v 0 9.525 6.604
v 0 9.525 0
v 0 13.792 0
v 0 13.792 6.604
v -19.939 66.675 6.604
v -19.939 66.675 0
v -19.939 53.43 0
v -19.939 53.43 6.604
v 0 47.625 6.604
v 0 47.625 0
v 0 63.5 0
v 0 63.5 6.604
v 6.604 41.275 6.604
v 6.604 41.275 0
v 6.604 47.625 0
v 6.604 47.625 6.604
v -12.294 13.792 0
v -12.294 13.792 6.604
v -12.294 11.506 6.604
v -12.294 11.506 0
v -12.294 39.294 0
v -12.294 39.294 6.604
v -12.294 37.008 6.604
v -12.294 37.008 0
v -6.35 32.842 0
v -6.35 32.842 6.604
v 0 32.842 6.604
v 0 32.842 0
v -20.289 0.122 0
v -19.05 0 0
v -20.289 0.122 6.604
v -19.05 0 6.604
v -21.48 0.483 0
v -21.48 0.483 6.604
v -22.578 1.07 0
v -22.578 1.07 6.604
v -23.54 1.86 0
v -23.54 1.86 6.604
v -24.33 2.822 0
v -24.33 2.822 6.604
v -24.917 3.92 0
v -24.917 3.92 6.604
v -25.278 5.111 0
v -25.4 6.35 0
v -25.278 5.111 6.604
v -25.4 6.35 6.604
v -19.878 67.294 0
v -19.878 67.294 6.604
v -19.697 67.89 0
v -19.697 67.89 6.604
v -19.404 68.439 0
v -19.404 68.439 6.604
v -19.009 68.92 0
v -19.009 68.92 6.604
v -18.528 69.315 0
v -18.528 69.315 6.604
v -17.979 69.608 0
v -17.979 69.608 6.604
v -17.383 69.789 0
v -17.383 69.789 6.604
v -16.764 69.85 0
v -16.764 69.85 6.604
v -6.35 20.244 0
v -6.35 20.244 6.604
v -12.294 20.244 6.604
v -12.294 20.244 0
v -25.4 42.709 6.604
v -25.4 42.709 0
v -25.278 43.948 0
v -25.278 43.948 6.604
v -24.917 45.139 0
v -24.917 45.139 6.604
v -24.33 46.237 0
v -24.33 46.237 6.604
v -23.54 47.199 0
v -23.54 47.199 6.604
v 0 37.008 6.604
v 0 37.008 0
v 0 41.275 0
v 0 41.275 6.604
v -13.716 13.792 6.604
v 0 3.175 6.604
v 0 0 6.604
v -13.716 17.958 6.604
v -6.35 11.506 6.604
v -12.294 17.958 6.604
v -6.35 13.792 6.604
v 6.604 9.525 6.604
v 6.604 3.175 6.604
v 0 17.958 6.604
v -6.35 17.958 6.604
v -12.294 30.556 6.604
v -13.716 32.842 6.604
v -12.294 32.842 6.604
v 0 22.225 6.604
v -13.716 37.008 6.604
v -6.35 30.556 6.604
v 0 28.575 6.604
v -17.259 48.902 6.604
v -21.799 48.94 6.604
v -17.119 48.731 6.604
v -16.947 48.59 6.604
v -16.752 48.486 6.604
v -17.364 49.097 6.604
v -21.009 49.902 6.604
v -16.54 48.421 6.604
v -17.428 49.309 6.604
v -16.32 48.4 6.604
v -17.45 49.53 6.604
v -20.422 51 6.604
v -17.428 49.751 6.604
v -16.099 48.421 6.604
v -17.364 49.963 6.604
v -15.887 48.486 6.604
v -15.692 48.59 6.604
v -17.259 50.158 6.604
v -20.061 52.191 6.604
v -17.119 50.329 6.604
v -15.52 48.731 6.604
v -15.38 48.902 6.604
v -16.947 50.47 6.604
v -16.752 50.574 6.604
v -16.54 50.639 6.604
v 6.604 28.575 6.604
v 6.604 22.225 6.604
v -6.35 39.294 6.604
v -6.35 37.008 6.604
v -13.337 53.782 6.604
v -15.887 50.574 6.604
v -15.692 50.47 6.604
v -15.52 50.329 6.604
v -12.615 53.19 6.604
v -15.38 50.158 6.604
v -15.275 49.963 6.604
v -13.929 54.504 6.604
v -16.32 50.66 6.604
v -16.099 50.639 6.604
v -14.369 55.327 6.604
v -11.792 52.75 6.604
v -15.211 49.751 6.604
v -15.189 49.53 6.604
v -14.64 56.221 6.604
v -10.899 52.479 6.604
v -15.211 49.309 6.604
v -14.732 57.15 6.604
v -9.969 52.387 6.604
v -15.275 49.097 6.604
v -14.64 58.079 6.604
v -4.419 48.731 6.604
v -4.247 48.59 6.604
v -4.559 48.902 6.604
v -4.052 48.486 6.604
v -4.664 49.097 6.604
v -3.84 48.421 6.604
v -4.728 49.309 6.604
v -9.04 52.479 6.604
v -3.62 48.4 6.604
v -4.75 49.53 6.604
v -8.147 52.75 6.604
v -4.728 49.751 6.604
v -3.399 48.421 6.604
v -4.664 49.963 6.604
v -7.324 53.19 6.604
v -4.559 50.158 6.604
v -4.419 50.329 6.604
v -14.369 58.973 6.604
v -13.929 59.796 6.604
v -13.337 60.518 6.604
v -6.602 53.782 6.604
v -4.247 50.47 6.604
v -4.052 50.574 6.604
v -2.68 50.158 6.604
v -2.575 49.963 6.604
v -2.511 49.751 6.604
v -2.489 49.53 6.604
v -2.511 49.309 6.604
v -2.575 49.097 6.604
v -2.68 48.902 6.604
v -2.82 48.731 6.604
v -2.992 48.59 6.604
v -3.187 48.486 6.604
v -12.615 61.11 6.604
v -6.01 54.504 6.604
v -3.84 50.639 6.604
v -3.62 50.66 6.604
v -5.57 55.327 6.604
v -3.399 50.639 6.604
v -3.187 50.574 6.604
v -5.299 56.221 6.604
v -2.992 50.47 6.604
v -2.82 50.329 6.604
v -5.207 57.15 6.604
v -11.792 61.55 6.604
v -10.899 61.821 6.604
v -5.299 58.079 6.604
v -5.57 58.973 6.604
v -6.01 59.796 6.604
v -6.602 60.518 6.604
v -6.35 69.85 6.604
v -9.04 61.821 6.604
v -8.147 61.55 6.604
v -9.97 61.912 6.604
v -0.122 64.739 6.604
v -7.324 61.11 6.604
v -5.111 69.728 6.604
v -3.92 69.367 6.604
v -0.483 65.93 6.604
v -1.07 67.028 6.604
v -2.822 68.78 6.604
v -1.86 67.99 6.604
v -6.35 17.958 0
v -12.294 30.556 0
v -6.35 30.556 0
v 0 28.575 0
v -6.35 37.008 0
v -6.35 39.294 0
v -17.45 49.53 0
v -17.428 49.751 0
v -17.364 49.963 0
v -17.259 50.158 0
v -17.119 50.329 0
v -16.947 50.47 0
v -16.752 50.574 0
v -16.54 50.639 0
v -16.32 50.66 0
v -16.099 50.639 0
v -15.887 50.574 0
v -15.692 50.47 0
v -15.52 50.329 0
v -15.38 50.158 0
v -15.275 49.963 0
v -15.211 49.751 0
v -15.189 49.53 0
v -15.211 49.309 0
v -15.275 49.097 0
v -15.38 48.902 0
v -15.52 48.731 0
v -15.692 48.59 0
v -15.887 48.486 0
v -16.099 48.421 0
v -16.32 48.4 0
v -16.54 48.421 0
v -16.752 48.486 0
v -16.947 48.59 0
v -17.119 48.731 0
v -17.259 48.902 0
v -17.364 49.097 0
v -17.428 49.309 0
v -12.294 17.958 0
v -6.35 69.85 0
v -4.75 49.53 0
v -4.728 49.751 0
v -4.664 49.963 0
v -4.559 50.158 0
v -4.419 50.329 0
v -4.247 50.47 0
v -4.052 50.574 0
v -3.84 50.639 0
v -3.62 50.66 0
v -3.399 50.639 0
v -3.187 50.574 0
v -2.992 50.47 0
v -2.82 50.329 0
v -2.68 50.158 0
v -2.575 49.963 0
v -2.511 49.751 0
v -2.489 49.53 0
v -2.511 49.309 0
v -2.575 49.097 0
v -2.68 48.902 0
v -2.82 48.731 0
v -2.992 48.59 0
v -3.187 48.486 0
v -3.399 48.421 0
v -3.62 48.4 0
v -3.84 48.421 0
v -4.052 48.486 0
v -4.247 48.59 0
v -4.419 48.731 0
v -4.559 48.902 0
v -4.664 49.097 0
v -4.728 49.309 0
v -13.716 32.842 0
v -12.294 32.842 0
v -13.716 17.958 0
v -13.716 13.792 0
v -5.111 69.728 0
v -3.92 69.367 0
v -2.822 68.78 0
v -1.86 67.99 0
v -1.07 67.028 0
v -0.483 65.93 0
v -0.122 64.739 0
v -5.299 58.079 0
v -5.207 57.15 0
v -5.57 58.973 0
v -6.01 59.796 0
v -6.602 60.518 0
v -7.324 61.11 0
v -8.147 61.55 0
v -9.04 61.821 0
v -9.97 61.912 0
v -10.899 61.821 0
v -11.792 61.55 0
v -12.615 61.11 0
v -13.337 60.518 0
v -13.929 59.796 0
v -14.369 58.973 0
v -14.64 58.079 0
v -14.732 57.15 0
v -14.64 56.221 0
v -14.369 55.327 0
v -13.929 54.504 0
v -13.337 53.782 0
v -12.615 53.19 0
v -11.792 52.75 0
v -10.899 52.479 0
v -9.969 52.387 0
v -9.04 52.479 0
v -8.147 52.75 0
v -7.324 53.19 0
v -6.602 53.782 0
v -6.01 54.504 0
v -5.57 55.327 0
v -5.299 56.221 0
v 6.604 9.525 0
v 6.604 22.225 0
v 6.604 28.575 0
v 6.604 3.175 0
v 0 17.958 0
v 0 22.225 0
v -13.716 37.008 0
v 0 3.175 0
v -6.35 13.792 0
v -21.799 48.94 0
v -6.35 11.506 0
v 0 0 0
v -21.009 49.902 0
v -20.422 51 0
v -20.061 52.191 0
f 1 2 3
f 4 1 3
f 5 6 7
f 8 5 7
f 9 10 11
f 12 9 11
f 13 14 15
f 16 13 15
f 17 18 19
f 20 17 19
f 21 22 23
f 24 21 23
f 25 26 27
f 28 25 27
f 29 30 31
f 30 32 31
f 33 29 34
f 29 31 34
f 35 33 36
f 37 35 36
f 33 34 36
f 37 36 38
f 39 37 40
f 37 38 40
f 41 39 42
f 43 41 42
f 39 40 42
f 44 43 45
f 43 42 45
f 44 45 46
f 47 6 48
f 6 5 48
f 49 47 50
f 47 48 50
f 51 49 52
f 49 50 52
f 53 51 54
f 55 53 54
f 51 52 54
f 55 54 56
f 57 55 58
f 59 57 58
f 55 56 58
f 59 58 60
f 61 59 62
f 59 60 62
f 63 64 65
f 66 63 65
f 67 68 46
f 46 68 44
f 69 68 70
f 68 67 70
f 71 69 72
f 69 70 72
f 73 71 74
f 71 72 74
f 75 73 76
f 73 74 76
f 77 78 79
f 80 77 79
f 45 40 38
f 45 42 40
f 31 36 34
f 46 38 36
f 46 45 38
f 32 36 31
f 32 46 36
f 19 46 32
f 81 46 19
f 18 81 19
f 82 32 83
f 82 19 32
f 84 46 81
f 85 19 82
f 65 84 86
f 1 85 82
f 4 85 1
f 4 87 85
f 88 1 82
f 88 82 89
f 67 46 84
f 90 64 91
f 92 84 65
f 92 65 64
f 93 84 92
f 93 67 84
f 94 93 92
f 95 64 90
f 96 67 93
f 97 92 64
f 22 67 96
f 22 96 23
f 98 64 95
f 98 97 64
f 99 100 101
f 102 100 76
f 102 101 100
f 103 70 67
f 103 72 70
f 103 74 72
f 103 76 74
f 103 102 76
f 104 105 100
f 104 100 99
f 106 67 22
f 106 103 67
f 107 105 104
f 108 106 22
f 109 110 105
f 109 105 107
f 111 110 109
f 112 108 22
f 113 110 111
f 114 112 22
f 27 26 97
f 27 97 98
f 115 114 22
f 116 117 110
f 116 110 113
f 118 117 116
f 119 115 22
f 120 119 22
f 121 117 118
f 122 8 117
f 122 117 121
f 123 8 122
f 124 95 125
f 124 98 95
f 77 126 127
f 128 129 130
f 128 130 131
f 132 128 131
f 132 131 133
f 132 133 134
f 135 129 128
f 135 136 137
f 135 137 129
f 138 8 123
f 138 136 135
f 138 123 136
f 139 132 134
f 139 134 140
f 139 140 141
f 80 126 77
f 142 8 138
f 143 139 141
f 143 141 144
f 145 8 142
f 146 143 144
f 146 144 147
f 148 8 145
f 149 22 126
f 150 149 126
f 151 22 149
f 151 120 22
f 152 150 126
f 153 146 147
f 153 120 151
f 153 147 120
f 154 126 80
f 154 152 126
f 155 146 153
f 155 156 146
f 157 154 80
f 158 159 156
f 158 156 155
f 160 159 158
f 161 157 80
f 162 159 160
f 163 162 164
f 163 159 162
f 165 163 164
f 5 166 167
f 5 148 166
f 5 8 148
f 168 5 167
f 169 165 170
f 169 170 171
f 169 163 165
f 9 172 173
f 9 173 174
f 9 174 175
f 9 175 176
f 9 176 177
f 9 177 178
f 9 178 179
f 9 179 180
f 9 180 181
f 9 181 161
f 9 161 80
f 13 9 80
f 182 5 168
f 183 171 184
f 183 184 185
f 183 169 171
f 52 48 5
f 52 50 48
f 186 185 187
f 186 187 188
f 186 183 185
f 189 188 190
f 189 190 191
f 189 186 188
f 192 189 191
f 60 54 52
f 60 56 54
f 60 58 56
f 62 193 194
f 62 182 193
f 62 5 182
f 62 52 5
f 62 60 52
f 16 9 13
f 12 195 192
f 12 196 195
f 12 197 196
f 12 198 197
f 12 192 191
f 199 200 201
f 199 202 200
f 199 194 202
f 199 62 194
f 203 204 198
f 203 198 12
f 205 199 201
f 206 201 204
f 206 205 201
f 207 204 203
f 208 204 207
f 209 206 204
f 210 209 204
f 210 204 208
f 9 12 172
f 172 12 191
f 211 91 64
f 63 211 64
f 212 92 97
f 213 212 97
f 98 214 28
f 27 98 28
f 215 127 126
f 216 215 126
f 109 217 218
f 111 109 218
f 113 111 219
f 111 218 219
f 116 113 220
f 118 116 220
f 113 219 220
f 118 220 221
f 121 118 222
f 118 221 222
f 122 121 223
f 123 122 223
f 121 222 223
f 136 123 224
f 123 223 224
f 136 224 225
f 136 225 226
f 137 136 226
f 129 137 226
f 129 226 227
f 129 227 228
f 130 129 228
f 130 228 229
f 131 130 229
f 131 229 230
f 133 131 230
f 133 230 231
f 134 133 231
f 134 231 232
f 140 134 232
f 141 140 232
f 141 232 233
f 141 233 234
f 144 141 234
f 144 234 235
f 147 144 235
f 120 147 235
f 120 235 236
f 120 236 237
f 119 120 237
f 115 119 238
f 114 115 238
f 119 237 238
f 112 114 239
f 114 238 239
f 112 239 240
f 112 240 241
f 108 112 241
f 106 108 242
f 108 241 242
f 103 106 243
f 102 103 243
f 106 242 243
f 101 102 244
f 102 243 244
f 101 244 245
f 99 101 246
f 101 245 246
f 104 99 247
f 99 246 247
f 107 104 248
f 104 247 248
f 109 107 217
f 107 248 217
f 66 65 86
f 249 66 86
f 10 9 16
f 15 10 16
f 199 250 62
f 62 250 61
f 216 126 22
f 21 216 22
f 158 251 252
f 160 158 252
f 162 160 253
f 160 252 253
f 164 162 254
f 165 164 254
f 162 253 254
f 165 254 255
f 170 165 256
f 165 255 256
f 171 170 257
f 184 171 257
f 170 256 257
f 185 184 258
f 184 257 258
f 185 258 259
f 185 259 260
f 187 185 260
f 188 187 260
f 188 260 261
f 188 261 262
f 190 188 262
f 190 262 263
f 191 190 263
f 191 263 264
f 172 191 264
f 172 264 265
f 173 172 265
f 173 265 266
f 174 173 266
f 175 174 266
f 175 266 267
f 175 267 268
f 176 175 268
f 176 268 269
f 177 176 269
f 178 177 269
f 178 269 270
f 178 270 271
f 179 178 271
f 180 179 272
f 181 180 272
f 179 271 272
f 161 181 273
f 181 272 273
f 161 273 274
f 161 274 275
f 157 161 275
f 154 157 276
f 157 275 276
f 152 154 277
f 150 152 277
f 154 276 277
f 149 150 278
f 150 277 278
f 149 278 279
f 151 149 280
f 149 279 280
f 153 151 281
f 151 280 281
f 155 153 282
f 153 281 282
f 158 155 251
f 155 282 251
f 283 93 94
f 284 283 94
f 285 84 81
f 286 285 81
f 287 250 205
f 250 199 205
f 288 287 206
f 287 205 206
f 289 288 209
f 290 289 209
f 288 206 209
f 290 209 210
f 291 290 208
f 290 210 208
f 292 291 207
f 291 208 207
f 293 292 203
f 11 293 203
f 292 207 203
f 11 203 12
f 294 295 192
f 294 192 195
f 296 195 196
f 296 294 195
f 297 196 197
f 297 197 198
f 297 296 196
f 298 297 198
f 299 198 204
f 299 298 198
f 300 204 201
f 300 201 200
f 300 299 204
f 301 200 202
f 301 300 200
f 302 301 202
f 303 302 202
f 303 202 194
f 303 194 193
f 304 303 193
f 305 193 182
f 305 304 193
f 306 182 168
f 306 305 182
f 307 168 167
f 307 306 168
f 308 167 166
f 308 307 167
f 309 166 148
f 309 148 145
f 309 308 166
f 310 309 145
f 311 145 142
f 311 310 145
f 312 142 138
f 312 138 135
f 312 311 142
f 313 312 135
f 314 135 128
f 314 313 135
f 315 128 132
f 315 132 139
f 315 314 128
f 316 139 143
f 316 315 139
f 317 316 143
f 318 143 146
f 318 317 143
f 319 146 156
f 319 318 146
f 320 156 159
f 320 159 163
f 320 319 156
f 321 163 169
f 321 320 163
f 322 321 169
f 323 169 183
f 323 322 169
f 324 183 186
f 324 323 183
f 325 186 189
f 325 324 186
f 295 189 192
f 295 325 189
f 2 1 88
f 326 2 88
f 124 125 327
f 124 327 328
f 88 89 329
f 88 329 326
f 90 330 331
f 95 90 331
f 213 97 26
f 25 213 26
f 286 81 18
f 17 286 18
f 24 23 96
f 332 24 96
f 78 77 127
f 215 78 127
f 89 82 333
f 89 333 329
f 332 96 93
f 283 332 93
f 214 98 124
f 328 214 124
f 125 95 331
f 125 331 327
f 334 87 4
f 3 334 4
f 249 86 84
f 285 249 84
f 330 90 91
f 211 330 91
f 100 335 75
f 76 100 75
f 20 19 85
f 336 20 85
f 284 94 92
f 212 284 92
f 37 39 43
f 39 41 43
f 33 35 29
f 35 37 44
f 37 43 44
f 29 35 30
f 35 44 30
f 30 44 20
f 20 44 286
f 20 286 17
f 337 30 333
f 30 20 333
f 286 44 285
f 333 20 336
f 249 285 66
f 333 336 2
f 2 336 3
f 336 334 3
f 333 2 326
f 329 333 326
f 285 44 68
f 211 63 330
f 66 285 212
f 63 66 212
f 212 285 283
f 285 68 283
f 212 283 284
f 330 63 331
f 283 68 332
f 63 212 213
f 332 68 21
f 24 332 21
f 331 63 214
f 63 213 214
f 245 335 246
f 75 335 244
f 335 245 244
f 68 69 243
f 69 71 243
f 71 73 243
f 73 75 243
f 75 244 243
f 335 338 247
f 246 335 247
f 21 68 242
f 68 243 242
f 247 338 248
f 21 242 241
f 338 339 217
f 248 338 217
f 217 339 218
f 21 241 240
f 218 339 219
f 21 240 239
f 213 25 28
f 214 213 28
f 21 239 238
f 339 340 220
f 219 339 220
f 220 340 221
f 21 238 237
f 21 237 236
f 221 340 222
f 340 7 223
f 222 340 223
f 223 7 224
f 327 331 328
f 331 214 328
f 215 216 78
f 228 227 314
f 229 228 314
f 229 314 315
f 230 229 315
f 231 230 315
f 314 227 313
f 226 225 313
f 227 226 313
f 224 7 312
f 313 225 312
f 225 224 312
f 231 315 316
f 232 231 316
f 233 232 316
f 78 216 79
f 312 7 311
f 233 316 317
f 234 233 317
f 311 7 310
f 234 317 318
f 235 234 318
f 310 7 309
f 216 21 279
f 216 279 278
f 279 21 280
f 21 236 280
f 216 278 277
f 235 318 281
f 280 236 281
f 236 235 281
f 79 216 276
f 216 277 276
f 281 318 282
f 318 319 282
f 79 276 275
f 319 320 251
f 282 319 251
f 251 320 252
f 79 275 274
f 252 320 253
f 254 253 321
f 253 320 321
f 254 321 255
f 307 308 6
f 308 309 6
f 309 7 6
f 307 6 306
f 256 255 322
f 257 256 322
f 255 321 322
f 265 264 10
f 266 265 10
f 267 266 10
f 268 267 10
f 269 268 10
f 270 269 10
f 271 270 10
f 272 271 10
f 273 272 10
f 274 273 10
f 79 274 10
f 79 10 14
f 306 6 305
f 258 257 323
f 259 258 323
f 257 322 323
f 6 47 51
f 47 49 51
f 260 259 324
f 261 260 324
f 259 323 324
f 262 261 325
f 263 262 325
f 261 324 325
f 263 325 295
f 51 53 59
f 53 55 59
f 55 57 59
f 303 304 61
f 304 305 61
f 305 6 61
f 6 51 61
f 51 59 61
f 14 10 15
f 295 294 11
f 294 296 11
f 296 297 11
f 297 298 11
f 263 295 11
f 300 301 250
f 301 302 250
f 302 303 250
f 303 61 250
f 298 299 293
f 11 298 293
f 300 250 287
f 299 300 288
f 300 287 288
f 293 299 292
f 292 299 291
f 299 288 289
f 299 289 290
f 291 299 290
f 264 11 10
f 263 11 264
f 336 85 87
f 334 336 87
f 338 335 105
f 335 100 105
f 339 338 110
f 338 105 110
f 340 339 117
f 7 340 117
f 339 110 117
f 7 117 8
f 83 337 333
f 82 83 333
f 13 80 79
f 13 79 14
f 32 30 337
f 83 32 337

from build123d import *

# Parameters (mm, degrees)
SKETCH1_R                 = 4.7625
BOSS_EXTRUDE1_DEPTH       = 6.604
CUT_EXTRUDE1_DEPTH        = 7.604
SKETCH3_W                 = 6.604
SKETCH3_H                 = 6.35
BOSS_EXTRUDE2_DEPTH       = 6.604
FILLET1_R                 = 6.35
FILLET2_R                 = 3.175
F_4_40_TAPPED_HOLE1_D     = 2.2606
F_4_40_TAPPED_HOLE1_DEPTH = 7.5946
F_4_40_TAPPED_HOLE1_TIP   = 0.679152758


with BuildPart() as part:
    # Sketch1 → Boss-Extrude1 (new body)
    with BuildSketch(Plane.XY):
        Polygon((0, 0), (0, 69.85), (-19.939, 69.85), (-19.939, 50.8), (-25.4, 45.339), (-25.4, 0), align=None)
        with Locations((-9.9695, 57.15)):
            Circle(SKETCH1_R, mode=Mode.SUBTRACT)
    extrude(amount=BOSS_EXTRUDE1_DEPTH)

    # Sketch2 → Cut-Extrude1 (cut, through all)
    with BuildSketch(Plane.XY.offset(6.604)):
        Polygon((-12.2936, 37.0078), (-13.716, 37.0078), (-13.716, 32.8422), (-12.2936, 32.8422), (-12.2936, 30.5562), (-6.35, 30.5562), (-6.35, 32.8422), (0, 32.8422), (0, 37.0078), (-6.35, 37.0078), (-6.35, 39.2938), (-12.2936, 39.2938), align=None)
        Polygon((-12.2936, 20.2438), (-12.2936, 17.9578), (-13.716, 17.9578), (-13.716, 13.7922), (-12.2936, 13.7922), (-12.2936, 11.5062), (-6.35, 11.5062), (-6.35, 13.7922), (0, 13.7922), (0, 17.9578), (-6.35, 17.9578), (-6.35, 20.2438), align=None)
    extrude(amount=-CUT_EXTRUDE1_DEPTH, mode=Mode.SUBTRACT)

    # Sketch3 → Boss-Extrude2 (add)
    with BuildSketch(Plane.XY.offset(6.604)):
        with Locations((3.302, 44.45)):
            Rectangle(SKETCH3_W, SKETCH3_H)
        with Locations((3.302, 25.4)):
            Rectangle(SKETCH3_W, SKETCH3_H)
        with Locations((3.302, 6.35)):
            Rectangle(SKETCH3_W, SKETCH3_H)
    extrude(amount=-BOSS_EXTRUDE2_DEPTH)

    # Fillet1
    fillet1_edges = [part.edges().sort_by_distance(p)[0] for p in [
        (-25.4, 0, 3.302),
        (-25.4, 45.339, 3.302),
        (-19.939, 50.8, 3.302),
        (0, 69.85, 3.302),
    ]]
    fillet(fillet1_edges, radius=FILLET1_R)

    # Fillet2
    fillet2_edges = [part.edges().sort_by_distance(p)[0] for p in [
        (-19.939, 69.85, 3.302),
    ]]
    fillet(fillet2_edges, radius=FILLET2_R)

    # #4-40 Tapped Hole1
    with Locations(Plane.XY.offset(6.604)):
        with Locations((-3.6195, 49.53), (-16.3195, 49.53)):
            Hole(F_4_40_TAPPED_HOLE1_D / 2, depth=F_4_40_TAPPED_HOLE1_DEPTH)
            with Locations((0, 0, -(F_4_40_TAPPED_HOLE1_DEPTH + F_4_40_TAPPED_HOLE1_TIP / 2))):  # 118° drill point
                Cone(0, F_4_40_TAPPED_HOLE1_D / 2, F_4_40_TAPPED_HOLE1_TIP, mode=Mode.SUBTRACT)


solid = part.part
